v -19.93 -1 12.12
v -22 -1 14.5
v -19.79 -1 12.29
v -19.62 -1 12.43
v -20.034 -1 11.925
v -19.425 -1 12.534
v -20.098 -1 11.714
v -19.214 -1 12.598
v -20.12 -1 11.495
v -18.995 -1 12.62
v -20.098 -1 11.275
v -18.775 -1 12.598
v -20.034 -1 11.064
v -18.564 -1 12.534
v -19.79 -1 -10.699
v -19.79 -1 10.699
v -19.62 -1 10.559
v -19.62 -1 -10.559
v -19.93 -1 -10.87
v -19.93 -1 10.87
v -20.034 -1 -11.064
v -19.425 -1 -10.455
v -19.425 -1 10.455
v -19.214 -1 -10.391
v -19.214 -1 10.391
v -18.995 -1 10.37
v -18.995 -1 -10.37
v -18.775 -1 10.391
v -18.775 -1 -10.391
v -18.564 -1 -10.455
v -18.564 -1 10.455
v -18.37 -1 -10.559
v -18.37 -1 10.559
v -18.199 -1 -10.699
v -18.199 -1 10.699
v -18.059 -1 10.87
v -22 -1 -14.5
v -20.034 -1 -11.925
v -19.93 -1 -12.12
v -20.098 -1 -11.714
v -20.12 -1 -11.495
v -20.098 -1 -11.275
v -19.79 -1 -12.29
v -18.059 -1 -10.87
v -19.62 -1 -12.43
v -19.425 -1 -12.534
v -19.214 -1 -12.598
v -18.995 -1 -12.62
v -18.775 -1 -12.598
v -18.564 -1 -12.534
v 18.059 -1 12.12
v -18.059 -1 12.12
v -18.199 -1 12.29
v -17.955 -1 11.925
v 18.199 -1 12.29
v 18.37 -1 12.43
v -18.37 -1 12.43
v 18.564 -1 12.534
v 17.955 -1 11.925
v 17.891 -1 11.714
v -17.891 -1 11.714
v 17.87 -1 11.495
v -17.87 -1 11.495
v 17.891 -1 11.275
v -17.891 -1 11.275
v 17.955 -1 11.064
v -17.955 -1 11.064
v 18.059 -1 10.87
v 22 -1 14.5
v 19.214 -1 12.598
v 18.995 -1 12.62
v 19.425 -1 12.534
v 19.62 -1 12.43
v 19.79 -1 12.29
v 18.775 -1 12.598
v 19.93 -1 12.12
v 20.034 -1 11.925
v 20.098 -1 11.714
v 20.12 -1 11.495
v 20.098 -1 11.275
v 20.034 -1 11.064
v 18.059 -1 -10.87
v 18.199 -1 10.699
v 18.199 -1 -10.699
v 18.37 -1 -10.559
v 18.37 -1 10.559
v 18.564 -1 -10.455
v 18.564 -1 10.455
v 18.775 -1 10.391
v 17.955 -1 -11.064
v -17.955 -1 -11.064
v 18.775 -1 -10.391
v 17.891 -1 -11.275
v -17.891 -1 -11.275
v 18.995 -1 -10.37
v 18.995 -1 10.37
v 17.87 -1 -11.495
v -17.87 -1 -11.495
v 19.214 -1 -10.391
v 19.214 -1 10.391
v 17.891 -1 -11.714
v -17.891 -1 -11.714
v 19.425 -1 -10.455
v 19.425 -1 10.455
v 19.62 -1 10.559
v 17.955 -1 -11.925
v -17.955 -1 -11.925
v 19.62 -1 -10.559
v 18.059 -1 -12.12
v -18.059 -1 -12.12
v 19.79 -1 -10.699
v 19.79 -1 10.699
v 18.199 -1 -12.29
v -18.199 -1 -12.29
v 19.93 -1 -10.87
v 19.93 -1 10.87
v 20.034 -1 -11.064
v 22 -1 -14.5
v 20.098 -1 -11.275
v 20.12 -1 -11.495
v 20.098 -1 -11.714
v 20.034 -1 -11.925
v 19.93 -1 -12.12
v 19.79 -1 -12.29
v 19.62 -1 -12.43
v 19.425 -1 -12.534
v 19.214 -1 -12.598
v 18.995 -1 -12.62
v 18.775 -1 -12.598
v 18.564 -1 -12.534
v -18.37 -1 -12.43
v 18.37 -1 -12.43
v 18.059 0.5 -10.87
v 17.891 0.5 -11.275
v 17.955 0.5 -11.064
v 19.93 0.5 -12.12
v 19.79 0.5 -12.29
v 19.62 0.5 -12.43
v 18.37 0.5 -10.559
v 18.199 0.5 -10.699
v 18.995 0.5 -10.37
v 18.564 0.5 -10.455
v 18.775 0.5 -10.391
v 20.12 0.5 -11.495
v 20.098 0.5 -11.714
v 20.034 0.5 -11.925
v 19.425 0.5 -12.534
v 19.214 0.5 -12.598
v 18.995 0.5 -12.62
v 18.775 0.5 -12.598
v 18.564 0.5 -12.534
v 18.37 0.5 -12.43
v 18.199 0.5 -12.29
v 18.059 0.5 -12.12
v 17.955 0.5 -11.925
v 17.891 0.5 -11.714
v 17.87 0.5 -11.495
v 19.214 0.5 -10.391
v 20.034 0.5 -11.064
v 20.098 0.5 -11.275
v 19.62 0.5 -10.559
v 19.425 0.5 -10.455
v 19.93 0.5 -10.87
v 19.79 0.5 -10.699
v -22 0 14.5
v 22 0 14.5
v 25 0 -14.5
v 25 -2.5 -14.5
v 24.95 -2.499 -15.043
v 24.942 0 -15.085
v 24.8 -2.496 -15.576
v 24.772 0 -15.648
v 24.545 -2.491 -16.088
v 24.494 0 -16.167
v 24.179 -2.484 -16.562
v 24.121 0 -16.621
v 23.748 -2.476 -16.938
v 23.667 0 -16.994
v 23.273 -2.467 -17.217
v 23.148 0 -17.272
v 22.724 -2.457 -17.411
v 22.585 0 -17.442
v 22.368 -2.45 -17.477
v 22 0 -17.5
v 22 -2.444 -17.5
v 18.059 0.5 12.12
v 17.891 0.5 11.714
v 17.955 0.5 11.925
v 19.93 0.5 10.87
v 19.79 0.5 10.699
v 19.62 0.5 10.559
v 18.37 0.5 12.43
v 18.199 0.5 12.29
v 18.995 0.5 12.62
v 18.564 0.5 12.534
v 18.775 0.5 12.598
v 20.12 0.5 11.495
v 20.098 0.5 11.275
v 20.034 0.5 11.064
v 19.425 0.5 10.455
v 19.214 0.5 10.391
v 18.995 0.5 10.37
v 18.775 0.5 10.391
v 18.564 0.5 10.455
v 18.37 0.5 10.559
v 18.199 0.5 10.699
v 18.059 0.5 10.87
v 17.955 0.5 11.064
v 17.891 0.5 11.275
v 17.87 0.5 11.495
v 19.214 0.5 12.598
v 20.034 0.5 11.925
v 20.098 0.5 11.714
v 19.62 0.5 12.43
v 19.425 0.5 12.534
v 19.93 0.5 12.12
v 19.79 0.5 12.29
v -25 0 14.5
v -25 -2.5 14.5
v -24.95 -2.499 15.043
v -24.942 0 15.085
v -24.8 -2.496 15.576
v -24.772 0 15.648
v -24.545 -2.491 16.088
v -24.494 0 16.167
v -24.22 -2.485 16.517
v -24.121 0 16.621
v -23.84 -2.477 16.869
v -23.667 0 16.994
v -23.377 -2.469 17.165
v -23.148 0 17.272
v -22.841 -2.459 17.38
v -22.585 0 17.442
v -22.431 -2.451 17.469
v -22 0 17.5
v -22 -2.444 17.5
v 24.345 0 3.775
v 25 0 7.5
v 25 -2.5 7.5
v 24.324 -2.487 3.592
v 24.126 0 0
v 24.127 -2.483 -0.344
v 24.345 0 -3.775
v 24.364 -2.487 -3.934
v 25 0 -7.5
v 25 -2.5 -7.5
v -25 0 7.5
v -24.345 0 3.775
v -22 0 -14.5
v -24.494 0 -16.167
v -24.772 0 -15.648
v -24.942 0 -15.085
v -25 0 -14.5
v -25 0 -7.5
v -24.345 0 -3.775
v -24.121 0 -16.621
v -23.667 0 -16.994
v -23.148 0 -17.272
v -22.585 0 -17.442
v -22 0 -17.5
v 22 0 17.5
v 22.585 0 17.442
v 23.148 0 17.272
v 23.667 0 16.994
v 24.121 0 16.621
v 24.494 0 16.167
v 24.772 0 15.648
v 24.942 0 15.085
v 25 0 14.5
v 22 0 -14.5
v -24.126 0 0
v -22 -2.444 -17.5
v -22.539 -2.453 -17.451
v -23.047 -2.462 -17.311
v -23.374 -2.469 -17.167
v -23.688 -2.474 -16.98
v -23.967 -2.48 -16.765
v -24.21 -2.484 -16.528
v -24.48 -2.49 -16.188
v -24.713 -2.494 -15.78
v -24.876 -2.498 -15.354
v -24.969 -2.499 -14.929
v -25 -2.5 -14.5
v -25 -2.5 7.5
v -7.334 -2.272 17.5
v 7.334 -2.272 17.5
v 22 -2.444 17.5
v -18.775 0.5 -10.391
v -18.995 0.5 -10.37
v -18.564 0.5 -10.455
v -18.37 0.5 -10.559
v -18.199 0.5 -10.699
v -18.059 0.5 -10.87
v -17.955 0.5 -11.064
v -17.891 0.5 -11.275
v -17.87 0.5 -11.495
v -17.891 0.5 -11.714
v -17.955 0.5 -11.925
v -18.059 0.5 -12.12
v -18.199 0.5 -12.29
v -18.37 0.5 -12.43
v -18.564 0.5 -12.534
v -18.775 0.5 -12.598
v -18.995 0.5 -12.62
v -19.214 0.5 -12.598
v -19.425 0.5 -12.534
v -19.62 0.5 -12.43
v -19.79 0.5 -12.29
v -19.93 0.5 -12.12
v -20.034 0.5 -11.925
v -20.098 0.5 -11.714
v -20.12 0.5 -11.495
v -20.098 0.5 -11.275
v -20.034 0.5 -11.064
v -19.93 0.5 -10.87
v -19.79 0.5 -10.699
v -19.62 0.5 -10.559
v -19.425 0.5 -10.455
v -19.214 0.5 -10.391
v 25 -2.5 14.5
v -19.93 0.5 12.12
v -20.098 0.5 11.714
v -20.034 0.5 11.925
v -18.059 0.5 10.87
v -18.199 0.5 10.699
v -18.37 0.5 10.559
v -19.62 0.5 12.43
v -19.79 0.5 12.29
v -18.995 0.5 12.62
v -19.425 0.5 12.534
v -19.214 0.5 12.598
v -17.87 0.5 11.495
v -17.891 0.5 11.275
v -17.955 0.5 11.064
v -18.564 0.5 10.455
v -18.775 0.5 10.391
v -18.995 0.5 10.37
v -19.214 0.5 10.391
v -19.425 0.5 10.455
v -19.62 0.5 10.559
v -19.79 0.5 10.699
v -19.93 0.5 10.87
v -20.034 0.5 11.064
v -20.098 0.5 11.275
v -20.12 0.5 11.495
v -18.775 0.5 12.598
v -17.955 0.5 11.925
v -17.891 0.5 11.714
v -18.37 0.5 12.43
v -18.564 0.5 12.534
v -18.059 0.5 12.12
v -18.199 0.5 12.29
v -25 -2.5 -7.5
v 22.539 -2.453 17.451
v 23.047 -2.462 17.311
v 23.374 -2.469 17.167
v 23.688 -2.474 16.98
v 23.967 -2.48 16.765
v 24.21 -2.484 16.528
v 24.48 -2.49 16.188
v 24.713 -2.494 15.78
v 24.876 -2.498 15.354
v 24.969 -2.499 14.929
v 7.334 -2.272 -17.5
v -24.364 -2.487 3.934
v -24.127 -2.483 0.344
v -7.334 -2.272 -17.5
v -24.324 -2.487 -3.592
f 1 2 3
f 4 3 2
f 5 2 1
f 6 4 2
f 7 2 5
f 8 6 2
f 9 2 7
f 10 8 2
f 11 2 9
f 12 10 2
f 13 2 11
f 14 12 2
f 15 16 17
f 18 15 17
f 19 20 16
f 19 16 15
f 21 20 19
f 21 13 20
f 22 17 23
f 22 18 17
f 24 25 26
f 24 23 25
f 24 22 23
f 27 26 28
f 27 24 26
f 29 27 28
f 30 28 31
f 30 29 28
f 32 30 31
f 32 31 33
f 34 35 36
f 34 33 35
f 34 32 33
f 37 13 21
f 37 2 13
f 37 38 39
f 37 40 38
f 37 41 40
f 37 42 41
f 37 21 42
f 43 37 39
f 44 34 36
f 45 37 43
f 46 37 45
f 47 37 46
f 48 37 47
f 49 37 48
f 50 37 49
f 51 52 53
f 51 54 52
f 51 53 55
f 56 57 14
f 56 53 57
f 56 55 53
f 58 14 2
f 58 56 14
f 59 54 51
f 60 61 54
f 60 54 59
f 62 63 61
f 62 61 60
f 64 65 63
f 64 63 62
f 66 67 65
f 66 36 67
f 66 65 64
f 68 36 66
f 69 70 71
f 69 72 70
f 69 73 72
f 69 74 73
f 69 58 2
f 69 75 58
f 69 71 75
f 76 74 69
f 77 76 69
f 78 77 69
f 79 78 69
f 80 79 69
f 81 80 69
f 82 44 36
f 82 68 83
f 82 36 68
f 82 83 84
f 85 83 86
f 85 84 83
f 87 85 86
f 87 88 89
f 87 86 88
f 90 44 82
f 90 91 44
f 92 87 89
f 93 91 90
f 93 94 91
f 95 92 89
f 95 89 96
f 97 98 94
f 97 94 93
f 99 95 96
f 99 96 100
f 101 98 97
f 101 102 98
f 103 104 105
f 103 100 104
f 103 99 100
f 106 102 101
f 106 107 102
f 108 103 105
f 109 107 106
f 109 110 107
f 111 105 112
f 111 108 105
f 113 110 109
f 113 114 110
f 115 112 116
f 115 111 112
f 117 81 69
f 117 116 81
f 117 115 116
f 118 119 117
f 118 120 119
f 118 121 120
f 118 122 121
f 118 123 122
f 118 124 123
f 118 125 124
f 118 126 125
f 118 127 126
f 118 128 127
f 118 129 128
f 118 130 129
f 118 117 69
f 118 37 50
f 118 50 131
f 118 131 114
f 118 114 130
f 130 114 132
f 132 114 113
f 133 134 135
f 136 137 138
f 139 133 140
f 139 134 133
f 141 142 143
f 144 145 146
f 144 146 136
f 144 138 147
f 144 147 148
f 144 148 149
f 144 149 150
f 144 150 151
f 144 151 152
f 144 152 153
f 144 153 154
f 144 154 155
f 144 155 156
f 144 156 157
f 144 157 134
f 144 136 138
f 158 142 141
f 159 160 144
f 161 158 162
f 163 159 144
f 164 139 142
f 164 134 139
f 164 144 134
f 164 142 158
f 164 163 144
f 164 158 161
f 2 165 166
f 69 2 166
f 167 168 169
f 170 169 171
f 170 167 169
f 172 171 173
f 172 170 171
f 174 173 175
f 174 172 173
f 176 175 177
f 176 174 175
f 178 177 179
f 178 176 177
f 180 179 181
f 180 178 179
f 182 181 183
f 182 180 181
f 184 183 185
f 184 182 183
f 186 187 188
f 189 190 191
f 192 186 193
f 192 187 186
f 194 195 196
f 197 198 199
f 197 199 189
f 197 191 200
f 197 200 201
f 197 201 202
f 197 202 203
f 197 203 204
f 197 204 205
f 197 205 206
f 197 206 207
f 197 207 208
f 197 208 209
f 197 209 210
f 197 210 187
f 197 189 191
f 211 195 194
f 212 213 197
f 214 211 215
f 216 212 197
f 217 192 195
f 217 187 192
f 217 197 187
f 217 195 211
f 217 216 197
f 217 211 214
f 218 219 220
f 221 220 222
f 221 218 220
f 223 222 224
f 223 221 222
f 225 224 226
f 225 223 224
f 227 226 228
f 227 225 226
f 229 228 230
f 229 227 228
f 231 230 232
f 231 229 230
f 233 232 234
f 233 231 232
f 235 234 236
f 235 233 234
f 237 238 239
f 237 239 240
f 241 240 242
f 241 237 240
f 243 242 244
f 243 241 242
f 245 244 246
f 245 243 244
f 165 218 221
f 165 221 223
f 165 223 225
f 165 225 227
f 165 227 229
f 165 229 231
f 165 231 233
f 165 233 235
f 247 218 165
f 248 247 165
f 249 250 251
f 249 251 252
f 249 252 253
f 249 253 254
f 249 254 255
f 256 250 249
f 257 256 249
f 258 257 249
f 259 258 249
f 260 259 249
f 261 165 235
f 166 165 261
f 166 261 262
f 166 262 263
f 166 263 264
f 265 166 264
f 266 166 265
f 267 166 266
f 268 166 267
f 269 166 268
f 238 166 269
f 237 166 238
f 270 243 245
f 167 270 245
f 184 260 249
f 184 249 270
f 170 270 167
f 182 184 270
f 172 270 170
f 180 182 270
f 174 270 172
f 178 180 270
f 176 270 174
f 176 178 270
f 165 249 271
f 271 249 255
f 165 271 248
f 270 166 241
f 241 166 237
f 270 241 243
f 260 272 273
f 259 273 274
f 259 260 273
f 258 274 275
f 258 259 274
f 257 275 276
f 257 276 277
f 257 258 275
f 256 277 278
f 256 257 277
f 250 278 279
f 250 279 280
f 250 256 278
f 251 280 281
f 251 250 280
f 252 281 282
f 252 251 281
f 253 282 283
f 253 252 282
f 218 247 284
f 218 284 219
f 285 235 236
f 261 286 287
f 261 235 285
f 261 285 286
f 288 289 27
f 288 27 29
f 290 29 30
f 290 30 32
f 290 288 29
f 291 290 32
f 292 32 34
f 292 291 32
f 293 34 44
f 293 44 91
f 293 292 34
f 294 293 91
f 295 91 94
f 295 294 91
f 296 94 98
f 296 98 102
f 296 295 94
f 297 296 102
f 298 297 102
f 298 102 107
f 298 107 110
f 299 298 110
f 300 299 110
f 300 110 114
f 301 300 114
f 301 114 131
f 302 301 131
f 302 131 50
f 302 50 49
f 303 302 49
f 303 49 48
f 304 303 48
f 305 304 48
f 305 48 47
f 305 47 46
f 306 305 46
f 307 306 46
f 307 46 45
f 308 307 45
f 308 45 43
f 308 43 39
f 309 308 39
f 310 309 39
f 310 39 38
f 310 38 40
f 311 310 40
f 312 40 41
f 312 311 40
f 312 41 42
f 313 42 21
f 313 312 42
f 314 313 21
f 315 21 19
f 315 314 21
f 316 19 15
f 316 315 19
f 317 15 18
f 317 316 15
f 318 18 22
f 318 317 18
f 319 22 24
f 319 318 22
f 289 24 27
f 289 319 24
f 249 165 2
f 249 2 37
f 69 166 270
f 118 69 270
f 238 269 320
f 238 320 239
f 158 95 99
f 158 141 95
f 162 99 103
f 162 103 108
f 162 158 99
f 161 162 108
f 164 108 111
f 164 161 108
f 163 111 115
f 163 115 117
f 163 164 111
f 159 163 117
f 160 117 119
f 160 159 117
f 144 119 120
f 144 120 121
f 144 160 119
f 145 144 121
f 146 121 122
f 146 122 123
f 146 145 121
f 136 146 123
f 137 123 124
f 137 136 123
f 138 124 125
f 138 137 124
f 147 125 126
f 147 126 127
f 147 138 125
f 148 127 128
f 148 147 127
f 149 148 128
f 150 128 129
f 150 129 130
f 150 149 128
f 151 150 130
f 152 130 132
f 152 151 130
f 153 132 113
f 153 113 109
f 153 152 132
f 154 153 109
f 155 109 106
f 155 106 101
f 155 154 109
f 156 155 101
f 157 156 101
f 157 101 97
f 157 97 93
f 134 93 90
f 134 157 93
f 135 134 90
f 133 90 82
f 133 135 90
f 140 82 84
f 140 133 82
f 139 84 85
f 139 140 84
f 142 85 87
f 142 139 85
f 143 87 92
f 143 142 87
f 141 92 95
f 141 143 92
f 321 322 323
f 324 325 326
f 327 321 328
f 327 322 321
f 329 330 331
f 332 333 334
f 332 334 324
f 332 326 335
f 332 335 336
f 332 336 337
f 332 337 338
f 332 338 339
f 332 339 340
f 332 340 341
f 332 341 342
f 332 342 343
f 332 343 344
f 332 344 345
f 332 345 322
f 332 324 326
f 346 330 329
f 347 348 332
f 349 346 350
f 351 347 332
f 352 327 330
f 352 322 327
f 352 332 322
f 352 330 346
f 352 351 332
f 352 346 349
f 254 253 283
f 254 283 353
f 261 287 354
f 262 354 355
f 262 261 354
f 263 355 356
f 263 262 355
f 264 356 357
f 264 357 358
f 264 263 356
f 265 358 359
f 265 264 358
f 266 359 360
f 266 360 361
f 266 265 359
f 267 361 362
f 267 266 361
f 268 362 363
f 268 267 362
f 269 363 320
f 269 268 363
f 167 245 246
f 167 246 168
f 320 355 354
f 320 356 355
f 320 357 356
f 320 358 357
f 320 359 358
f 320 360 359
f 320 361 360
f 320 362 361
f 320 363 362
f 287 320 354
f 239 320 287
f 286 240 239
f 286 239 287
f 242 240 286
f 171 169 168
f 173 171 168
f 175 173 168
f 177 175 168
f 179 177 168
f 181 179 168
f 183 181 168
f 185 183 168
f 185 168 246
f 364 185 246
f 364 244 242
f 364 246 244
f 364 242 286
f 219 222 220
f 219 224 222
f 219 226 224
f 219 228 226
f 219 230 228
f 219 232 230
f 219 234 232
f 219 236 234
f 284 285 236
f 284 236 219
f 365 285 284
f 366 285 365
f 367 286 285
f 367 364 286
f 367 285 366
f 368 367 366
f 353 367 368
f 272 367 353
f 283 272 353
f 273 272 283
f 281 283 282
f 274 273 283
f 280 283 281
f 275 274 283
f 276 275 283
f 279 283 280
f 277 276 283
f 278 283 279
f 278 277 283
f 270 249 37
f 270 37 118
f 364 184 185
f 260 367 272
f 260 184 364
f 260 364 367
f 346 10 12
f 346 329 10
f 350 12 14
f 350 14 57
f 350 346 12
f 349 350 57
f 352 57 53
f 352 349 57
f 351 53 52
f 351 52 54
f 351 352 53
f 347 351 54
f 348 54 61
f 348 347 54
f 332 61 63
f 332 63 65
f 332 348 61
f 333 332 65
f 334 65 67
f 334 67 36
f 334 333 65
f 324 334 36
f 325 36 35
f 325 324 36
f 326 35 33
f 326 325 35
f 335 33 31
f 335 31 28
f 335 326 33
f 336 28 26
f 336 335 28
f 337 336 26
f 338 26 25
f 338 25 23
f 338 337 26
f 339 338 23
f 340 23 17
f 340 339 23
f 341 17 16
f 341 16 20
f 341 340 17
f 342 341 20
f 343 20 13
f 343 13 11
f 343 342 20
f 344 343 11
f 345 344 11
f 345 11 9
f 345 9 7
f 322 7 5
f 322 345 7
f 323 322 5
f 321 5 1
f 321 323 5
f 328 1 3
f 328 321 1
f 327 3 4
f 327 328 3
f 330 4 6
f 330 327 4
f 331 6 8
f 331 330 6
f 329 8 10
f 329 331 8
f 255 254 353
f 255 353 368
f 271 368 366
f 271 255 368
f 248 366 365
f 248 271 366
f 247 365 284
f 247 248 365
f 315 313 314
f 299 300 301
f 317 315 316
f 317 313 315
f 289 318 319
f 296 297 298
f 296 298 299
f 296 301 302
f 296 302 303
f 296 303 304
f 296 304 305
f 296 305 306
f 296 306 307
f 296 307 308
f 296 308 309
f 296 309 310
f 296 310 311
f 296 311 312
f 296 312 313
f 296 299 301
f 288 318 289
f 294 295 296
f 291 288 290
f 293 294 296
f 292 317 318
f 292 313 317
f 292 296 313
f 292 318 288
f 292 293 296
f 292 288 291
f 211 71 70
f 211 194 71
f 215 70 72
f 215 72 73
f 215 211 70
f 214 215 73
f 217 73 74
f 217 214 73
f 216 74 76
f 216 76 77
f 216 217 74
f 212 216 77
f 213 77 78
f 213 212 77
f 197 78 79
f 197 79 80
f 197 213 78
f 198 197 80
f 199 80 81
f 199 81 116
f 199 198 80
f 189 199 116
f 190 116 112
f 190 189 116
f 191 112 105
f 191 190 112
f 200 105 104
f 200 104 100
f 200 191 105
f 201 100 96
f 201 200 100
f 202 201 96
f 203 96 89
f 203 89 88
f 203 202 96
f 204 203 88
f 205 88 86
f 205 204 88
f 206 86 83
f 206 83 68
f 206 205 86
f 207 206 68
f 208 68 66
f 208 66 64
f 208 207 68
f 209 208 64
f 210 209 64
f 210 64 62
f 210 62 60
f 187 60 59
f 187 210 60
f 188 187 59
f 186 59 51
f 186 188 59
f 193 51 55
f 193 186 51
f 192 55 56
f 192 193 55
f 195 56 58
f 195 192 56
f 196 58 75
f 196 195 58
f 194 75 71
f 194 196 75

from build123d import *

# Parameters (mm, degrees)
BOSS_EXTRUDE1_DEPTH     = 2.5
CUT_EXTRUDE1_DEPTH      = 31.618621785
CUT_EXTRUDE1_DEPTH_BACK = 31.618621785
SKETCH3_W               = 44
SKETCH3_H               = 29
SKETCH3_R               = 1.125
CUT_EXTRUDE2_DEPTH      = 1
BOSS_EXTRUDE2_START     = 0.5
SKETCH3_5_R             = 1.125
BOSS_EXTRUDE2_DEPTH     = 0.5


with BuildPart() as part:
    # Sketch1 → Boss-Extrude1 (new body)
    with BuildSketch(Plane(origin=(0, 0, 0), x_dir=(1, 0, 0), z_dir=(0, 1, 0))):
        with BuildLine():
            Line((22, 17.5), (-22, 17.5))
            ThreePointArc((-22, 17.5), (-24.121320344, 16.621320344), (-25, 14.5))
            Line((-25, 14.5), (-25, 7.5))
            ThreePointArc((-25, 7.5), (-24.12566565, 0), (-25, -7.5))
            Line((-25, -7.5), (-25, -14.5))
            ThreePointArc((-25, -14.5), (-24.121320344, -16.621320344), (-22, -17.5))
            Line((-22, -17.5), (22, -17.5))
            ThreePointArc((22, -17.5), (24.121320344, -16.621320344), (25, -14.5))
            Line((25, -14.5), (25, -7.5))
            ThreePointArc((25, -7.5), (24.12566565, 0), (25, 7.5))
            Line((25, 7.5), (25, 14.5))
            ThreePointArc((25, 14.5), (24.121320344, 16.621320344), (22, 17.5))
        make_face()
    extrude(amount=-BOSS_EXTRUDE1_DEPTH)

    # Sketch2 → Cut-Extrude1 (cut, two sides: drawn at the far end of the back side and taken through both)
    with BuildSketch(Plane.XY.offset(-CUT_EXTRUDE1_DEPTH_BACK)):
        with BuildLine():
            Line((-25, -2.5), (25, -2.5))
            ThreePointArc((25, -2.5), (0, -2.25), (-25, -2.5))
        make_face()
    extrude(amount=CUT_EXTRUDE1_DEPTH + CUT_EXTRUDE1_DEPTH_BACK, mode=Mode.SUBTRACT)

    # Sketch3 → Cut-Extrude2 (cut)
    with BuildSketch(Plane(origin=(0, 0, 0), x_dir=(1, 0, 0), z_dir=(0, 1, 0))):
        Rectangle(SKETCH3_W, SKETCH3_H)
        with Locations((-18.99479618, -11.49479618)):
            Circle(SKETCH3_R, mode=Mode.SUBTRACT)
        with Locations((18.99479618, -11.49479618)):
            Circle(SKETCH3_R, mode=Mode.SUBTRACT)
        with BuildLine():
            ThreePointArc((-17.86979618, 11.49479618), (-19.425315041, 10.455431706), (-19.790291309, 12.290291309))
            ThreePointArc((-19.790291309, 12.290291309), (-18.564277319, 12.534160654), (-17.86979618, 11.49479618))
        make_face(mode=Mode.SUBTRACT)
        with Locations((18.99479618, 11.49479618)):
            Circle(SKETCH3_R, mode=Mode.SUBTRACT)
    extrude(amount=-CUT_EXTRUDE2_DEPTH, mode=Mode.SUBTRACT)

    # Sketch3<5> → Boss-Extrude2 (add)
    with BuildSketch(Plane(origin=(0, 0, 0), x_dir=(1, 0, 0), z_dir=(0, 1, 0)).offset(BOSS_EXTRUDE2_START)):
        with Locations((-18.99479618, 11.49479618)):
            Circle(SKETCH3_5_R)
        with Locations((18.99479618, 11.49479618)):
            Circle(SKETCH3_5_R)
        with Locations((18.99479618, -11.49479618)):
            Circle(SKETCH3_5_R)
        with Locations((-18.99479618, -11.49479618)):
            Circle(SKETCH3_5_R)
    extrude(amount=-BOSS_EXTRUDE2_DEPTH)


solid = part.part
